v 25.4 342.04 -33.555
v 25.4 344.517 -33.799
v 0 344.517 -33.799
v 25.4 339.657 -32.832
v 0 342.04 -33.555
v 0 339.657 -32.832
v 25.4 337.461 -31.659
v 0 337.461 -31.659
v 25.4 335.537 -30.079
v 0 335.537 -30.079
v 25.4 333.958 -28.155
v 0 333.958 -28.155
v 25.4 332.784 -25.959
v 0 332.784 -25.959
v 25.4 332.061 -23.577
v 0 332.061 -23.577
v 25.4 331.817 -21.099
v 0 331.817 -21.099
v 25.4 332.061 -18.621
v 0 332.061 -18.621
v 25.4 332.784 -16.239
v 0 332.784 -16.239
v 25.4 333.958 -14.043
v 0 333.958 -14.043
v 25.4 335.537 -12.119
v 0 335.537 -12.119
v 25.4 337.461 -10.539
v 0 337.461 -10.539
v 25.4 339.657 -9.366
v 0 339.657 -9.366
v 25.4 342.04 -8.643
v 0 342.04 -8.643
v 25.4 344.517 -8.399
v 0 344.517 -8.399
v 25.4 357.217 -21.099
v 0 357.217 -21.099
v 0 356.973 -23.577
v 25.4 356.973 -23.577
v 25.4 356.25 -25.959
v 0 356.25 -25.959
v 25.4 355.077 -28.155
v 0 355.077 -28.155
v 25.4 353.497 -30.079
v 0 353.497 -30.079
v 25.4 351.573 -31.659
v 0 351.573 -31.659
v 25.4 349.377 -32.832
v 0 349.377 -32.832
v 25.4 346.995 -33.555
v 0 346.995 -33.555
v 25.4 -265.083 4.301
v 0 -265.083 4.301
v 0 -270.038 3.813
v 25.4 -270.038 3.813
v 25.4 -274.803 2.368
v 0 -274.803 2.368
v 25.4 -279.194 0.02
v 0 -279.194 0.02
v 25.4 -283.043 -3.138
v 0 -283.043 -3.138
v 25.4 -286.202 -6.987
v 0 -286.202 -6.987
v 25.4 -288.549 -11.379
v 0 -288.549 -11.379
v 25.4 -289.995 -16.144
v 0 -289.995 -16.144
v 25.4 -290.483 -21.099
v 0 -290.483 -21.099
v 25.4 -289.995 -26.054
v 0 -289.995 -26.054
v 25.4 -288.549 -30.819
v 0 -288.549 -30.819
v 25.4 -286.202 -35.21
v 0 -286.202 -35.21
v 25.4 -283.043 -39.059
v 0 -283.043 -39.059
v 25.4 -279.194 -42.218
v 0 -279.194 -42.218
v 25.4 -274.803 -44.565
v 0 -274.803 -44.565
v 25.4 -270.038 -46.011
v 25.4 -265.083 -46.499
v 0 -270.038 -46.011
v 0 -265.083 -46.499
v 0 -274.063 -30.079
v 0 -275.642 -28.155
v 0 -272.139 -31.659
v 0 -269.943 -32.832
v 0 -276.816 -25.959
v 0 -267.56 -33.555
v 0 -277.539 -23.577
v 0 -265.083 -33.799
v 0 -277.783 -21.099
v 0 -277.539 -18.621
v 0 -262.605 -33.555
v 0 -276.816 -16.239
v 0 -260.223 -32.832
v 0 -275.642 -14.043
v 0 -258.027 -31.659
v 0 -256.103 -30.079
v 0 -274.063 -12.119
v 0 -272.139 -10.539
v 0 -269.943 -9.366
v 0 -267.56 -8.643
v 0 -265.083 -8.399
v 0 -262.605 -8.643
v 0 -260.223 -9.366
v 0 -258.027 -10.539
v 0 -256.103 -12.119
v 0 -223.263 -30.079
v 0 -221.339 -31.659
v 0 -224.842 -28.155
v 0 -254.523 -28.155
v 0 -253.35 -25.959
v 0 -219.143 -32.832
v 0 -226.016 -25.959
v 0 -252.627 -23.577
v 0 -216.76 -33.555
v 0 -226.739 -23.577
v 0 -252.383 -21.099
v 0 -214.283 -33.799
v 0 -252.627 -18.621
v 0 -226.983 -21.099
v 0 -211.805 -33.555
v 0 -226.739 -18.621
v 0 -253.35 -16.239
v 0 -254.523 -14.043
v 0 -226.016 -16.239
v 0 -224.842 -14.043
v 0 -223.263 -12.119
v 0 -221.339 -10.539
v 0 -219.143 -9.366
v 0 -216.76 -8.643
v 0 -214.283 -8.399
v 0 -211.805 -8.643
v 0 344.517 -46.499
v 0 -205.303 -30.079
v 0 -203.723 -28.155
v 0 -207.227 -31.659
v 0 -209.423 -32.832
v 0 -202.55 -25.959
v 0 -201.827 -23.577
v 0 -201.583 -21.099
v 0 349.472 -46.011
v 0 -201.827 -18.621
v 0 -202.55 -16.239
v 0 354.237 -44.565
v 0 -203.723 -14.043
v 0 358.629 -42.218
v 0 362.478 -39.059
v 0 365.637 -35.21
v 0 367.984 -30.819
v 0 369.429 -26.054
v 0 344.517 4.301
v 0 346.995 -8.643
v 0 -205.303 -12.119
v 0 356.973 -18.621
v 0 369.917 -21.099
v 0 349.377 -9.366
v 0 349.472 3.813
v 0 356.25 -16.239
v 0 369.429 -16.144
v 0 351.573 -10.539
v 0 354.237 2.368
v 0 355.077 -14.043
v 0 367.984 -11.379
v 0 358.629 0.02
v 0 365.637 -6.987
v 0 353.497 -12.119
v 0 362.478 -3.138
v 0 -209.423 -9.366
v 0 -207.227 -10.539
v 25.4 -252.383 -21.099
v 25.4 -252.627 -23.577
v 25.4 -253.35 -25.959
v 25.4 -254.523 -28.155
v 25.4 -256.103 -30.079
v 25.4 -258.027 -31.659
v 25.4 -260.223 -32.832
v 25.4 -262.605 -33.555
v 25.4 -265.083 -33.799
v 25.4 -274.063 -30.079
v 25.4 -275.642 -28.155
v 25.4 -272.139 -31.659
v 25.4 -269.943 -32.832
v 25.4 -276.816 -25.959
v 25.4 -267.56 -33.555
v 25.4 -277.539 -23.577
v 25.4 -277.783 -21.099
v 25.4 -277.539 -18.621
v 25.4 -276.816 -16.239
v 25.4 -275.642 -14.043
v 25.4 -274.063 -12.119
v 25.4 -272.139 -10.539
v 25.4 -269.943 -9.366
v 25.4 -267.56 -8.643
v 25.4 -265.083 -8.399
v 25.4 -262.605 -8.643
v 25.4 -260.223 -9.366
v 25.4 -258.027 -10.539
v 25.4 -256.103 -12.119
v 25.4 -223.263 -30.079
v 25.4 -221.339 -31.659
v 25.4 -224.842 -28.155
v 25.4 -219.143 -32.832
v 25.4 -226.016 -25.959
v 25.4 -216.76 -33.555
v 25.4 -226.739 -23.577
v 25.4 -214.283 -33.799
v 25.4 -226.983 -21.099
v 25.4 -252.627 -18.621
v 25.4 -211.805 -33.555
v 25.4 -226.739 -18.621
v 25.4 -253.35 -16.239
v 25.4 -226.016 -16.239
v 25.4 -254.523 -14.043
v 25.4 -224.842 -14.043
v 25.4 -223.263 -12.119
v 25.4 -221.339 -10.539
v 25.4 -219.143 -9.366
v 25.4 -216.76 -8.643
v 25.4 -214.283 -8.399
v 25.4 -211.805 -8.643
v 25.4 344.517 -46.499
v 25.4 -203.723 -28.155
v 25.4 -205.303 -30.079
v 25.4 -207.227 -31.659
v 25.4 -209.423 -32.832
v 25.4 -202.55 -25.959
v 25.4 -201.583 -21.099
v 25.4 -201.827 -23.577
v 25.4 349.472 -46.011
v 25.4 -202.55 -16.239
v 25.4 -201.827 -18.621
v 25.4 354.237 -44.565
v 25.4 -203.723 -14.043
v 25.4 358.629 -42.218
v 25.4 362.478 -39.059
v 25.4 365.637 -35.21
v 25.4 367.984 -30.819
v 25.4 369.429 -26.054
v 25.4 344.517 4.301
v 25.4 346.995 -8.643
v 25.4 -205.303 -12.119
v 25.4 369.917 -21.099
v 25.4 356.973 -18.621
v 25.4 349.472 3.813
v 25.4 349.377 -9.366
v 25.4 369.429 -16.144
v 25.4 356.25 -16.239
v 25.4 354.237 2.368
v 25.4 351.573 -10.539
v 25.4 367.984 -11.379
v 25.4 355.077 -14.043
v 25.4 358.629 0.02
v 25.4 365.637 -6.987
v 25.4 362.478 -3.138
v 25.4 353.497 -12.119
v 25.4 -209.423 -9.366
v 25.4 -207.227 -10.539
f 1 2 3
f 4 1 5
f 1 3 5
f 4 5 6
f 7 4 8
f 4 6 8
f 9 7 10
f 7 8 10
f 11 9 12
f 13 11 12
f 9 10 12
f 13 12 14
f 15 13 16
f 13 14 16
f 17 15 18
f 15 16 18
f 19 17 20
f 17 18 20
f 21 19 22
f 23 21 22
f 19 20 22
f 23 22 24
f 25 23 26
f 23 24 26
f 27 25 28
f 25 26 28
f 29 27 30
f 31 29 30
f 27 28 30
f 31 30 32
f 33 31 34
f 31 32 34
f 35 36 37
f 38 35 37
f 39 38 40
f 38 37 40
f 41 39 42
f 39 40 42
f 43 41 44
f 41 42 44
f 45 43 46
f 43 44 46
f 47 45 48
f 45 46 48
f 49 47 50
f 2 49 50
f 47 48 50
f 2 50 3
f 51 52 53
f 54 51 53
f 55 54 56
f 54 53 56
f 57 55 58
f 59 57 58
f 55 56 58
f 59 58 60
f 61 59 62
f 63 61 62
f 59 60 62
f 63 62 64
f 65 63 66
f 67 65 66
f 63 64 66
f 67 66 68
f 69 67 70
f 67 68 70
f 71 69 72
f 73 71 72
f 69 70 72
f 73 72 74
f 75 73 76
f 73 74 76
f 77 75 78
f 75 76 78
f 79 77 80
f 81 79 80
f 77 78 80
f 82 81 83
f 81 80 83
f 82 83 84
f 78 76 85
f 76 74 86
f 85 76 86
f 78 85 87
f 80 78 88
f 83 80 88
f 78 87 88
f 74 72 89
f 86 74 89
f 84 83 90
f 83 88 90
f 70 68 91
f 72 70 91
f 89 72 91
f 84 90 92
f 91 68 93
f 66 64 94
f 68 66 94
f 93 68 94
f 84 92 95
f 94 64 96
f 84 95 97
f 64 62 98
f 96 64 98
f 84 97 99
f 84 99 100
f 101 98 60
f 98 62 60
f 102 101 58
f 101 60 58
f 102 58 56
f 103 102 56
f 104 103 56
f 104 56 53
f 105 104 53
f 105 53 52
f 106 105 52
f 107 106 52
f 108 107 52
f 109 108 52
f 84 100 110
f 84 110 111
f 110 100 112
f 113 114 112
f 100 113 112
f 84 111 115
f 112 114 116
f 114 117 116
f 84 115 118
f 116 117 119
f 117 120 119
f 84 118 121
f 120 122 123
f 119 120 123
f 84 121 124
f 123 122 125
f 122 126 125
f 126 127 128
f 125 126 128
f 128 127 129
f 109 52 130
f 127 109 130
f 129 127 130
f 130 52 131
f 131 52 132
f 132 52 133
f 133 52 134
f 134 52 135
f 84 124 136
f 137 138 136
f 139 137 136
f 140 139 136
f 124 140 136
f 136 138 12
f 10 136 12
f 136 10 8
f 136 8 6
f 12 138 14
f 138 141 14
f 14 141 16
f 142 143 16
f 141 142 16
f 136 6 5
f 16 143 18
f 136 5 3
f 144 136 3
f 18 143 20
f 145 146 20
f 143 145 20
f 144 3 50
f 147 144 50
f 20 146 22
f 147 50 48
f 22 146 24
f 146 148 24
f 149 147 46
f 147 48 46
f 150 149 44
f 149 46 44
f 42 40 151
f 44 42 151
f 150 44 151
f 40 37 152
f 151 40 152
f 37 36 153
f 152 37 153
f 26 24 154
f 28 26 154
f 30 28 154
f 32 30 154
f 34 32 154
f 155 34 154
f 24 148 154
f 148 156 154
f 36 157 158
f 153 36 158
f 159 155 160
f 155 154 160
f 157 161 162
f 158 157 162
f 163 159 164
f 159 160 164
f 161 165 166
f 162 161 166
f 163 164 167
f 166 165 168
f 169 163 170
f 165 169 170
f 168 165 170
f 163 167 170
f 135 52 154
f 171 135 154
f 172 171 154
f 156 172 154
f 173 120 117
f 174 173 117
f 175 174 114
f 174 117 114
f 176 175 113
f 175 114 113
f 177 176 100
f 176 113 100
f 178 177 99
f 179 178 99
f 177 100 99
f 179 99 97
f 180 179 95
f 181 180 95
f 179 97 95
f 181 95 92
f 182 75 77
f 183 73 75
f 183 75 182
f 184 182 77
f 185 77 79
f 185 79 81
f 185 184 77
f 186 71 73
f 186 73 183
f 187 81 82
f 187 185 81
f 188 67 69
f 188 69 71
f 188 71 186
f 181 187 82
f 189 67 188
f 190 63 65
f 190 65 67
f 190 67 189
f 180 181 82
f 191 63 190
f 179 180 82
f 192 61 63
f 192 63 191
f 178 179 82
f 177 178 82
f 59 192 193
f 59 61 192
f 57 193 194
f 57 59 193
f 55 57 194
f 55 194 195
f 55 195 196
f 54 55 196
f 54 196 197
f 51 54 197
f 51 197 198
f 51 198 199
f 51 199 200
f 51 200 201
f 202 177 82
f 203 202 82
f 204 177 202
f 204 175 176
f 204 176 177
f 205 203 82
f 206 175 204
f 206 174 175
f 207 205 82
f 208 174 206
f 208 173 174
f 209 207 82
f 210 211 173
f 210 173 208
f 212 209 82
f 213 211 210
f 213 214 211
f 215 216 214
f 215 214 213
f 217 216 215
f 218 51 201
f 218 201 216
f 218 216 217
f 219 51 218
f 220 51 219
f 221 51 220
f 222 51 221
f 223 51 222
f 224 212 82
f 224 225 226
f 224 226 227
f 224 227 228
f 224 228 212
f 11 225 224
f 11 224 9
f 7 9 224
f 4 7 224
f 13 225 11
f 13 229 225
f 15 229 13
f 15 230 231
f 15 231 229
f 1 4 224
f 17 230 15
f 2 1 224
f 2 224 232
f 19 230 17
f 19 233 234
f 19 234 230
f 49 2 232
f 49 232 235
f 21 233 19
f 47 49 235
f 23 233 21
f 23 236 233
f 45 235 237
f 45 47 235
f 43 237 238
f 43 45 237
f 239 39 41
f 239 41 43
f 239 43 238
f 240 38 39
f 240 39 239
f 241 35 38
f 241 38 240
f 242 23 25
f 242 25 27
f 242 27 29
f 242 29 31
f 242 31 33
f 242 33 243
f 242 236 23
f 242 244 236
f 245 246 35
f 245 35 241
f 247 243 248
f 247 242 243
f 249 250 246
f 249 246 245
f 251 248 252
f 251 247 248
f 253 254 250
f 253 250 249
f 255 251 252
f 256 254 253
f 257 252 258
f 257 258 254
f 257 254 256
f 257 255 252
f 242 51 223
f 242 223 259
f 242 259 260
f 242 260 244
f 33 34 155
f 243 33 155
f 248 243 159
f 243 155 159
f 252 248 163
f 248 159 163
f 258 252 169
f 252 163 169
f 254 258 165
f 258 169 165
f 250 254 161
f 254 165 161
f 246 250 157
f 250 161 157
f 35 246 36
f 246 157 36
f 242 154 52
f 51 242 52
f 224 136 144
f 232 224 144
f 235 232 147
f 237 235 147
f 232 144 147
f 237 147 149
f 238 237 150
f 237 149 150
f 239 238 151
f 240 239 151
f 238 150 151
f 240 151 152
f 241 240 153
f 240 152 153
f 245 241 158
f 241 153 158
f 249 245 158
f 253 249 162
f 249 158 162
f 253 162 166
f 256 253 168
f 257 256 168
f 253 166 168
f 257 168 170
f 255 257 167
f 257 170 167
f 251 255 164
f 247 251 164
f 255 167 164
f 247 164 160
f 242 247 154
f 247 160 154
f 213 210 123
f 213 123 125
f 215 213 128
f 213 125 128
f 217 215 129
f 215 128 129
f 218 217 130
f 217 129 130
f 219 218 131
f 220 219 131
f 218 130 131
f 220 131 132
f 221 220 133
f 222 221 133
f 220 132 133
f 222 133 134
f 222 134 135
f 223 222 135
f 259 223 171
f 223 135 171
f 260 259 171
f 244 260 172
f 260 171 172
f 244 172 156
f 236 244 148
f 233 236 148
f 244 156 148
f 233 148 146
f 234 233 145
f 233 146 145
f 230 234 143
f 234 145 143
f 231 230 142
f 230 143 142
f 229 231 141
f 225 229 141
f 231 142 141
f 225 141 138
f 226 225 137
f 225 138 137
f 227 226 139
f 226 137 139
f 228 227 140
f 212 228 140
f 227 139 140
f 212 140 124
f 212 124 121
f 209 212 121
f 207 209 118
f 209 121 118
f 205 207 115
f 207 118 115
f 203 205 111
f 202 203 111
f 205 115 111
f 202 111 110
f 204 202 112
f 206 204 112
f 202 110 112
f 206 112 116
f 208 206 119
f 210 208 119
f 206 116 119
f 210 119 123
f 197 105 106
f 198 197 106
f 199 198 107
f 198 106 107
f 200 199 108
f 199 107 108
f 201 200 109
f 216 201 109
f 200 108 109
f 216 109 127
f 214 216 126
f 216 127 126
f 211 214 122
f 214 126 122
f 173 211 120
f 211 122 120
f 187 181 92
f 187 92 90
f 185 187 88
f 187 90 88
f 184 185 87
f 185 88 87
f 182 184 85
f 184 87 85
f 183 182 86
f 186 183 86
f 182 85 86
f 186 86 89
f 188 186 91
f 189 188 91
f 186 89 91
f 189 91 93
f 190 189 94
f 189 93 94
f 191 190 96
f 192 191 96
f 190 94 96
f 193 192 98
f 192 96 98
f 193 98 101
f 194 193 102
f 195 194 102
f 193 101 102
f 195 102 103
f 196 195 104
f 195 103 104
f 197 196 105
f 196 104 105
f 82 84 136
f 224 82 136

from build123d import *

# Parameters (mm, degrees)
F1_DEPTH = 25.4


with BuildPart() as f1:
    # F0 (on Right) → F1 (new body)
    with BuildSketch(Plane.YZ):
        with BuildLine():
            ThreePointArc((-239.6828063071, -21.0989156985), (-247.1222940649, -3.1384034563), (-265.0828063071, 4.3010843015))
            Line((-265.0828063071, 4.3010843015), (-265.0828063071, -8.3989156985))
            ThreePointArc((-265.0828063071, -8.3989156985), (-256.102550186, -12.1186595774), (-252.3828063071, -21.0989156985))
            ThreePointArc((-252.3828063071, -21.0989156985), (-256.102550186, -30.0791718195), (-265.0828063071, -33.7989156985))
            Line((-265.0828063071, -33.7989156985), (-265.0828063071, -46.4989156985))
            ThreePointArc((-265.0828063071, -46.4989156985), (-247.1222940649, -39.0594279406), (-239.6828063071, -21.0989156985))
        make_face()
        with BuildLine():
            Line((344.5171936929, 4.3010843015), (-265.0828063071, 4.3010843015))
            ThreePointArc((-265.0828063071, 4.3010843015), (-247.1222940649, -3.1384034563), (-239.6828063071, -21.0989156985))
            ThreePointArc((-239.6828063071, -21.0989156985), (-247.1222940649, -39.0594279406), (-265.0828063071, -46.4989156985))
            Line((-265.0828063071, -46.4989156985), (344.5171936929, -46.4989156985))
            ThreePointArc((344.5171936929, -46.4989156985), (319.1171936929, -21.0989156985), (344.5171936929, 4.3010843015))
        make_face()
        with BuildLine():
            ThreePointArc((-201.5828063071, -21.0989156985), (-214.2828063071, -33.7989156985), (-226.9828063071, -21.0989156985))
            ThreePointArc((-226.9828063071, -21.0989156985), (-214.2828063071, -8.3989156985), (-201.5828063071, -21.0989156985))
        make_face(mode=Mode.SUBTRACT)
        with BuildLine():
            Line((-265.0828063071, -8.3989156985), (-265.0828063071, 4.3010843015))
            ThreePointArc((-265.0828063071, 4.3010843015), (-290.4828063071, -21.0989156985), (-265.0828063071, -46.4989156985))
            Line((-265.0828063071, -46.4989156985), (-265.0828063071, -33.7989156985))
            ThreePointArc((-265.0828063071, -33.7989156985), (-277.7828063071, -21.0989156985), (-265.0828063071, -8.3989156985))
        make_face()
        with BuildLine():
            ThreePointArc((369.9171936929, -21.0989156985), (362.4777059351, -3.1384034563), (344.5171936929, 4.3010843015))
            Line((344.5171936929, 4.3010843015), (344.5171936929, -8.3989156985))
            ThreePointArc((344.5171936929, -8.3989156985), (353.497449814, -12.1186595774), (357.2171936929, -21.0989156985))
            ThreePointArc((357.2171936929, -21.0989156985), (353.497449814, -30.0791718195), (344.5171936929, -33.7989156985))
            Line((344.5171936929, -33.7989156985), (344.5171936929, -46.4989156985))
            ThreePointArc((344.5171936929, -46.4989156985), (362.4777059351, -39.0594279406), (369.9171936929, -21.0989156985))
        make_face()
        with BuildLine():
            Line((344.5171936929, -8.3989156985), (344.5171936929, 4.3010843015))
            ThreePointArc((344.5171936929, 4.3010843015), (319.1171936929, -21.0989156985), (344.5171936929, -46.4989156985))
            Line((344.5171936929, -46.4989156985), (344.5171936929, -33.7989156985))
            ThreePointArc((344.5171936929, -33.7989156985), (331.8171936929, -21.0989156985), (344.5171936929, -8.3989156985))
        make_face()
    extrude(amount=F1_DEPTH)


solid = f1.part
